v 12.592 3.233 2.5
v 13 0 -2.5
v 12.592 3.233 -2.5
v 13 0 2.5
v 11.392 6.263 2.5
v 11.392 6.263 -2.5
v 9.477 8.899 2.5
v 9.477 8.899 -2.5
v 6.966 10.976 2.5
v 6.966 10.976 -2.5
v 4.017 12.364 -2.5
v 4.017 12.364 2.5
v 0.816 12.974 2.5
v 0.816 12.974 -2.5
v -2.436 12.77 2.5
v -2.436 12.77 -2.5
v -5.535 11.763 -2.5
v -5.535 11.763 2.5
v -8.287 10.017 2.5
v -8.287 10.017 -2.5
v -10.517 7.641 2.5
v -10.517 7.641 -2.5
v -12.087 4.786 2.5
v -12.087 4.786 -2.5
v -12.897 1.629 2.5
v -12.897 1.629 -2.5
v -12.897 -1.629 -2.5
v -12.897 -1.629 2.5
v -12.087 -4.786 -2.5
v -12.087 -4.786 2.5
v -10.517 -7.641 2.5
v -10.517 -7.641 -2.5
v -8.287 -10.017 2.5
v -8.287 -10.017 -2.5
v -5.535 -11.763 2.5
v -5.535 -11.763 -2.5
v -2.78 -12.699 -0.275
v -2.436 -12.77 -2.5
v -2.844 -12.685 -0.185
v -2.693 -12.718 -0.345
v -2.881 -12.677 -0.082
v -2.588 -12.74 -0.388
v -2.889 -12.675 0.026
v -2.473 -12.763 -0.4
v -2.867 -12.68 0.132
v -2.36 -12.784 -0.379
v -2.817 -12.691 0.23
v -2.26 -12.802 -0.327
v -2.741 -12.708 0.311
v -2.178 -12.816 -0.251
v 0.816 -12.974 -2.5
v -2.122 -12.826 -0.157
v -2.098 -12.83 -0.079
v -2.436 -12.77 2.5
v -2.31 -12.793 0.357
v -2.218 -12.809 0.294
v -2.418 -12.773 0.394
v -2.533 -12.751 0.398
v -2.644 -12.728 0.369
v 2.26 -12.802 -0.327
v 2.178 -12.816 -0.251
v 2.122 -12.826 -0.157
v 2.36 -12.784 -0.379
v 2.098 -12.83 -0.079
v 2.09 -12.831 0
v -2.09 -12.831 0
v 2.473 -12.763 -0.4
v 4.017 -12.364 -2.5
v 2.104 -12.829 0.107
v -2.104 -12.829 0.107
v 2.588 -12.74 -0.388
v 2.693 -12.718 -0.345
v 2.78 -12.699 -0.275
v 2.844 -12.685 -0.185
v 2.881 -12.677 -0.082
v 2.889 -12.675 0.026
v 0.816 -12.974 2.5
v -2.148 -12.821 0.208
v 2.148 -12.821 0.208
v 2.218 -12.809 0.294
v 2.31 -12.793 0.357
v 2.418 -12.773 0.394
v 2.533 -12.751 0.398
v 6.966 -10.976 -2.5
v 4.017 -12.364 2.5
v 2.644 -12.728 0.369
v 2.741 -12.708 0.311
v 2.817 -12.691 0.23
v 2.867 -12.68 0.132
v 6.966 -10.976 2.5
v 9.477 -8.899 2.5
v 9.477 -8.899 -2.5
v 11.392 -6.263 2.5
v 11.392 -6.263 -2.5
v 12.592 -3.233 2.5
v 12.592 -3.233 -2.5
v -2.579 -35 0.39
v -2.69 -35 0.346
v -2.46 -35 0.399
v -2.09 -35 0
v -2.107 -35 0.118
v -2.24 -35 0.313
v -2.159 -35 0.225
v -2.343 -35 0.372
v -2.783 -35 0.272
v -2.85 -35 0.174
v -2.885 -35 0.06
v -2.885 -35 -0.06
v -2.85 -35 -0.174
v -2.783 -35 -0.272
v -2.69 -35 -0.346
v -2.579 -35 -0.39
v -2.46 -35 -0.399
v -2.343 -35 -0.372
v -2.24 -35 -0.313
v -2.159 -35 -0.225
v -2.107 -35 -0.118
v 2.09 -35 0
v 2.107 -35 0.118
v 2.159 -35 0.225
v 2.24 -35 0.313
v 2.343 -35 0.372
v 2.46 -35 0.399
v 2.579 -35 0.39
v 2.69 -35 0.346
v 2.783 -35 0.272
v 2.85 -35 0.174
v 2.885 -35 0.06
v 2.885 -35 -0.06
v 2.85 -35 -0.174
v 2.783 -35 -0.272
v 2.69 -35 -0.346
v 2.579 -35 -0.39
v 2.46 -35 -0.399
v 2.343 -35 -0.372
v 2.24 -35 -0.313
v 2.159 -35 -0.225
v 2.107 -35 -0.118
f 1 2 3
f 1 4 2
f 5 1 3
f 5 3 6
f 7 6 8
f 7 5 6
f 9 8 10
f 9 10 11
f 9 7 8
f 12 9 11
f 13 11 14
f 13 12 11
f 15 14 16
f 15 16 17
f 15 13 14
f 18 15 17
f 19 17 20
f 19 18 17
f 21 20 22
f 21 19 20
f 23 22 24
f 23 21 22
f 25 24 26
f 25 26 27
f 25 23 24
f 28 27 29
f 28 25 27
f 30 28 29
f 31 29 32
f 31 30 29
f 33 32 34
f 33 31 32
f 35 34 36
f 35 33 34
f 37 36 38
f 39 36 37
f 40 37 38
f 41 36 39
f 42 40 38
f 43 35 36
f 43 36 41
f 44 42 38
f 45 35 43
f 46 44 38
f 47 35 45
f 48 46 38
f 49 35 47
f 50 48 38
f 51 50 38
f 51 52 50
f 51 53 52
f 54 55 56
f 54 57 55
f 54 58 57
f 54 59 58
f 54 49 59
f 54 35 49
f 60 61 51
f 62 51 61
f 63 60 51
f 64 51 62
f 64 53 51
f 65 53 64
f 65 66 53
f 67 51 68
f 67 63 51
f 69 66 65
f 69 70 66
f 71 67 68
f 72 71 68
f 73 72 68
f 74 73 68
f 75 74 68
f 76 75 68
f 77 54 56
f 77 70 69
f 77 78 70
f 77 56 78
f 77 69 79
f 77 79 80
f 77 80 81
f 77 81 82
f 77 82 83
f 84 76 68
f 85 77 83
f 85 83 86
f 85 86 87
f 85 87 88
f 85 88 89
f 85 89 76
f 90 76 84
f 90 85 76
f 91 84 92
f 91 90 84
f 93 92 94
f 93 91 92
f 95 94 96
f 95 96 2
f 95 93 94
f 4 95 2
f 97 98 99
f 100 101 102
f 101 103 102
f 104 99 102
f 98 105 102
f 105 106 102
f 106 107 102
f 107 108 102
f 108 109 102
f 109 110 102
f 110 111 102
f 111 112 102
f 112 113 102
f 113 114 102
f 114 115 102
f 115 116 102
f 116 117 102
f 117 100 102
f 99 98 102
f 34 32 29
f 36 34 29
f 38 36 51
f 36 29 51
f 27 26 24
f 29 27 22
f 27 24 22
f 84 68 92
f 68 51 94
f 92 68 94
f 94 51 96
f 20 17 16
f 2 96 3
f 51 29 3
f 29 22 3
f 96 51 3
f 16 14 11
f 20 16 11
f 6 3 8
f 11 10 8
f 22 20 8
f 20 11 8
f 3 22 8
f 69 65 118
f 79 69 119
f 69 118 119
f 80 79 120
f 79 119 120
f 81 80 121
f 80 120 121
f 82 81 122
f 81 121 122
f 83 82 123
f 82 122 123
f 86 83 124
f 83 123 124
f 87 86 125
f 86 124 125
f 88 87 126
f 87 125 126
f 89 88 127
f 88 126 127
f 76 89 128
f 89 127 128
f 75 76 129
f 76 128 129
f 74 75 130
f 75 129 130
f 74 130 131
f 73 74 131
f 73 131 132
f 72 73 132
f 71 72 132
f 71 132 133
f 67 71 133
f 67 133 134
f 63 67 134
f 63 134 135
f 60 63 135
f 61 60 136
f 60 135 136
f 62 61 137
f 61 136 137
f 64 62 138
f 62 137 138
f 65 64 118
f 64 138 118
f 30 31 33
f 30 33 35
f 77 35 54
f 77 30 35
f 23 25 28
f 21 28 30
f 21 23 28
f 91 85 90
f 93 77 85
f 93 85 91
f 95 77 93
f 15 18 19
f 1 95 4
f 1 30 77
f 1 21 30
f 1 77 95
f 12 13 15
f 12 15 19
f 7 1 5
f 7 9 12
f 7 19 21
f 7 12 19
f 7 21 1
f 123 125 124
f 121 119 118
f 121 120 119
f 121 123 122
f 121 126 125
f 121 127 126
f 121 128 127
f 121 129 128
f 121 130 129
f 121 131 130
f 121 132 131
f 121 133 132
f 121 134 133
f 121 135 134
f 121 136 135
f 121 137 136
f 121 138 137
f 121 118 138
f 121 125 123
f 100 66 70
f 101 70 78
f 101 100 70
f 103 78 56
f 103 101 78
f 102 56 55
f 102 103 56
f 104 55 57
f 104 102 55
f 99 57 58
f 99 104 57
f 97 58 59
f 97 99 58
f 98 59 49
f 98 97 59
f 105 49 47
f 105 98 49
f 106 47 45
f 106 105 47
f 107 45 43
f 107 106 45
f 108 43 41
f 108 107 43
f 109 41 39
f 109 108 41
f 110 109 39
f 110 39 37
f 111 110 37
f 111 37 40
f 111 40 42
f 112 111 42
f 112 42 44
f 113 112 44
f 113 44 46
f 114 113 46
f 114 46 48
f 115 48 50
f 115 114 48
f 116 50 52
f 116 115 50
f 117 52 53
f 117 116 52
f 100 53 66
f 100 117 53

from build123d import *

# Parameters (mm, degrees)
SKETCH1_R           = 13
BOSS_EXTRUDE1_DEPTH = 2.5
SKETCH3_R           = 0.4


with BuildPart() as part:
    # Sketch1 → Boss-Extrude1 (new, symmetric)
    with BuildSketch(Plane.XY):
        Circle(SKETCH1_R)
    extrude(amount=BOSS_EXTRUDE1_DEPTH, both=True)

    # Sweep1: sweep along a path in Sketch2
    with BuildLine(Plane.XY) as sweep1_path:
        Line((-2.5, 0), (-2.5, -35))
    # Sketch3 → Sweep1 (sweep)
    with BuildSketch(Plane(origin=(0, 0, 0), x_dir=(1, 0, 0), z_dir=(0, 1, 0))):
        with Locations((-2.489602721, 0)):
            Circle(SKETCH3_R)
    sweep1 = sweep(path=sweep1_path.line)

    # Mirror1: Sweep1 across plane
    add(sweep1.mirror(Plane(origin=(0, 0, 0), x_dir=(0, 0, 1), z_dir=(1, 0, 0))))


solid = part.part
